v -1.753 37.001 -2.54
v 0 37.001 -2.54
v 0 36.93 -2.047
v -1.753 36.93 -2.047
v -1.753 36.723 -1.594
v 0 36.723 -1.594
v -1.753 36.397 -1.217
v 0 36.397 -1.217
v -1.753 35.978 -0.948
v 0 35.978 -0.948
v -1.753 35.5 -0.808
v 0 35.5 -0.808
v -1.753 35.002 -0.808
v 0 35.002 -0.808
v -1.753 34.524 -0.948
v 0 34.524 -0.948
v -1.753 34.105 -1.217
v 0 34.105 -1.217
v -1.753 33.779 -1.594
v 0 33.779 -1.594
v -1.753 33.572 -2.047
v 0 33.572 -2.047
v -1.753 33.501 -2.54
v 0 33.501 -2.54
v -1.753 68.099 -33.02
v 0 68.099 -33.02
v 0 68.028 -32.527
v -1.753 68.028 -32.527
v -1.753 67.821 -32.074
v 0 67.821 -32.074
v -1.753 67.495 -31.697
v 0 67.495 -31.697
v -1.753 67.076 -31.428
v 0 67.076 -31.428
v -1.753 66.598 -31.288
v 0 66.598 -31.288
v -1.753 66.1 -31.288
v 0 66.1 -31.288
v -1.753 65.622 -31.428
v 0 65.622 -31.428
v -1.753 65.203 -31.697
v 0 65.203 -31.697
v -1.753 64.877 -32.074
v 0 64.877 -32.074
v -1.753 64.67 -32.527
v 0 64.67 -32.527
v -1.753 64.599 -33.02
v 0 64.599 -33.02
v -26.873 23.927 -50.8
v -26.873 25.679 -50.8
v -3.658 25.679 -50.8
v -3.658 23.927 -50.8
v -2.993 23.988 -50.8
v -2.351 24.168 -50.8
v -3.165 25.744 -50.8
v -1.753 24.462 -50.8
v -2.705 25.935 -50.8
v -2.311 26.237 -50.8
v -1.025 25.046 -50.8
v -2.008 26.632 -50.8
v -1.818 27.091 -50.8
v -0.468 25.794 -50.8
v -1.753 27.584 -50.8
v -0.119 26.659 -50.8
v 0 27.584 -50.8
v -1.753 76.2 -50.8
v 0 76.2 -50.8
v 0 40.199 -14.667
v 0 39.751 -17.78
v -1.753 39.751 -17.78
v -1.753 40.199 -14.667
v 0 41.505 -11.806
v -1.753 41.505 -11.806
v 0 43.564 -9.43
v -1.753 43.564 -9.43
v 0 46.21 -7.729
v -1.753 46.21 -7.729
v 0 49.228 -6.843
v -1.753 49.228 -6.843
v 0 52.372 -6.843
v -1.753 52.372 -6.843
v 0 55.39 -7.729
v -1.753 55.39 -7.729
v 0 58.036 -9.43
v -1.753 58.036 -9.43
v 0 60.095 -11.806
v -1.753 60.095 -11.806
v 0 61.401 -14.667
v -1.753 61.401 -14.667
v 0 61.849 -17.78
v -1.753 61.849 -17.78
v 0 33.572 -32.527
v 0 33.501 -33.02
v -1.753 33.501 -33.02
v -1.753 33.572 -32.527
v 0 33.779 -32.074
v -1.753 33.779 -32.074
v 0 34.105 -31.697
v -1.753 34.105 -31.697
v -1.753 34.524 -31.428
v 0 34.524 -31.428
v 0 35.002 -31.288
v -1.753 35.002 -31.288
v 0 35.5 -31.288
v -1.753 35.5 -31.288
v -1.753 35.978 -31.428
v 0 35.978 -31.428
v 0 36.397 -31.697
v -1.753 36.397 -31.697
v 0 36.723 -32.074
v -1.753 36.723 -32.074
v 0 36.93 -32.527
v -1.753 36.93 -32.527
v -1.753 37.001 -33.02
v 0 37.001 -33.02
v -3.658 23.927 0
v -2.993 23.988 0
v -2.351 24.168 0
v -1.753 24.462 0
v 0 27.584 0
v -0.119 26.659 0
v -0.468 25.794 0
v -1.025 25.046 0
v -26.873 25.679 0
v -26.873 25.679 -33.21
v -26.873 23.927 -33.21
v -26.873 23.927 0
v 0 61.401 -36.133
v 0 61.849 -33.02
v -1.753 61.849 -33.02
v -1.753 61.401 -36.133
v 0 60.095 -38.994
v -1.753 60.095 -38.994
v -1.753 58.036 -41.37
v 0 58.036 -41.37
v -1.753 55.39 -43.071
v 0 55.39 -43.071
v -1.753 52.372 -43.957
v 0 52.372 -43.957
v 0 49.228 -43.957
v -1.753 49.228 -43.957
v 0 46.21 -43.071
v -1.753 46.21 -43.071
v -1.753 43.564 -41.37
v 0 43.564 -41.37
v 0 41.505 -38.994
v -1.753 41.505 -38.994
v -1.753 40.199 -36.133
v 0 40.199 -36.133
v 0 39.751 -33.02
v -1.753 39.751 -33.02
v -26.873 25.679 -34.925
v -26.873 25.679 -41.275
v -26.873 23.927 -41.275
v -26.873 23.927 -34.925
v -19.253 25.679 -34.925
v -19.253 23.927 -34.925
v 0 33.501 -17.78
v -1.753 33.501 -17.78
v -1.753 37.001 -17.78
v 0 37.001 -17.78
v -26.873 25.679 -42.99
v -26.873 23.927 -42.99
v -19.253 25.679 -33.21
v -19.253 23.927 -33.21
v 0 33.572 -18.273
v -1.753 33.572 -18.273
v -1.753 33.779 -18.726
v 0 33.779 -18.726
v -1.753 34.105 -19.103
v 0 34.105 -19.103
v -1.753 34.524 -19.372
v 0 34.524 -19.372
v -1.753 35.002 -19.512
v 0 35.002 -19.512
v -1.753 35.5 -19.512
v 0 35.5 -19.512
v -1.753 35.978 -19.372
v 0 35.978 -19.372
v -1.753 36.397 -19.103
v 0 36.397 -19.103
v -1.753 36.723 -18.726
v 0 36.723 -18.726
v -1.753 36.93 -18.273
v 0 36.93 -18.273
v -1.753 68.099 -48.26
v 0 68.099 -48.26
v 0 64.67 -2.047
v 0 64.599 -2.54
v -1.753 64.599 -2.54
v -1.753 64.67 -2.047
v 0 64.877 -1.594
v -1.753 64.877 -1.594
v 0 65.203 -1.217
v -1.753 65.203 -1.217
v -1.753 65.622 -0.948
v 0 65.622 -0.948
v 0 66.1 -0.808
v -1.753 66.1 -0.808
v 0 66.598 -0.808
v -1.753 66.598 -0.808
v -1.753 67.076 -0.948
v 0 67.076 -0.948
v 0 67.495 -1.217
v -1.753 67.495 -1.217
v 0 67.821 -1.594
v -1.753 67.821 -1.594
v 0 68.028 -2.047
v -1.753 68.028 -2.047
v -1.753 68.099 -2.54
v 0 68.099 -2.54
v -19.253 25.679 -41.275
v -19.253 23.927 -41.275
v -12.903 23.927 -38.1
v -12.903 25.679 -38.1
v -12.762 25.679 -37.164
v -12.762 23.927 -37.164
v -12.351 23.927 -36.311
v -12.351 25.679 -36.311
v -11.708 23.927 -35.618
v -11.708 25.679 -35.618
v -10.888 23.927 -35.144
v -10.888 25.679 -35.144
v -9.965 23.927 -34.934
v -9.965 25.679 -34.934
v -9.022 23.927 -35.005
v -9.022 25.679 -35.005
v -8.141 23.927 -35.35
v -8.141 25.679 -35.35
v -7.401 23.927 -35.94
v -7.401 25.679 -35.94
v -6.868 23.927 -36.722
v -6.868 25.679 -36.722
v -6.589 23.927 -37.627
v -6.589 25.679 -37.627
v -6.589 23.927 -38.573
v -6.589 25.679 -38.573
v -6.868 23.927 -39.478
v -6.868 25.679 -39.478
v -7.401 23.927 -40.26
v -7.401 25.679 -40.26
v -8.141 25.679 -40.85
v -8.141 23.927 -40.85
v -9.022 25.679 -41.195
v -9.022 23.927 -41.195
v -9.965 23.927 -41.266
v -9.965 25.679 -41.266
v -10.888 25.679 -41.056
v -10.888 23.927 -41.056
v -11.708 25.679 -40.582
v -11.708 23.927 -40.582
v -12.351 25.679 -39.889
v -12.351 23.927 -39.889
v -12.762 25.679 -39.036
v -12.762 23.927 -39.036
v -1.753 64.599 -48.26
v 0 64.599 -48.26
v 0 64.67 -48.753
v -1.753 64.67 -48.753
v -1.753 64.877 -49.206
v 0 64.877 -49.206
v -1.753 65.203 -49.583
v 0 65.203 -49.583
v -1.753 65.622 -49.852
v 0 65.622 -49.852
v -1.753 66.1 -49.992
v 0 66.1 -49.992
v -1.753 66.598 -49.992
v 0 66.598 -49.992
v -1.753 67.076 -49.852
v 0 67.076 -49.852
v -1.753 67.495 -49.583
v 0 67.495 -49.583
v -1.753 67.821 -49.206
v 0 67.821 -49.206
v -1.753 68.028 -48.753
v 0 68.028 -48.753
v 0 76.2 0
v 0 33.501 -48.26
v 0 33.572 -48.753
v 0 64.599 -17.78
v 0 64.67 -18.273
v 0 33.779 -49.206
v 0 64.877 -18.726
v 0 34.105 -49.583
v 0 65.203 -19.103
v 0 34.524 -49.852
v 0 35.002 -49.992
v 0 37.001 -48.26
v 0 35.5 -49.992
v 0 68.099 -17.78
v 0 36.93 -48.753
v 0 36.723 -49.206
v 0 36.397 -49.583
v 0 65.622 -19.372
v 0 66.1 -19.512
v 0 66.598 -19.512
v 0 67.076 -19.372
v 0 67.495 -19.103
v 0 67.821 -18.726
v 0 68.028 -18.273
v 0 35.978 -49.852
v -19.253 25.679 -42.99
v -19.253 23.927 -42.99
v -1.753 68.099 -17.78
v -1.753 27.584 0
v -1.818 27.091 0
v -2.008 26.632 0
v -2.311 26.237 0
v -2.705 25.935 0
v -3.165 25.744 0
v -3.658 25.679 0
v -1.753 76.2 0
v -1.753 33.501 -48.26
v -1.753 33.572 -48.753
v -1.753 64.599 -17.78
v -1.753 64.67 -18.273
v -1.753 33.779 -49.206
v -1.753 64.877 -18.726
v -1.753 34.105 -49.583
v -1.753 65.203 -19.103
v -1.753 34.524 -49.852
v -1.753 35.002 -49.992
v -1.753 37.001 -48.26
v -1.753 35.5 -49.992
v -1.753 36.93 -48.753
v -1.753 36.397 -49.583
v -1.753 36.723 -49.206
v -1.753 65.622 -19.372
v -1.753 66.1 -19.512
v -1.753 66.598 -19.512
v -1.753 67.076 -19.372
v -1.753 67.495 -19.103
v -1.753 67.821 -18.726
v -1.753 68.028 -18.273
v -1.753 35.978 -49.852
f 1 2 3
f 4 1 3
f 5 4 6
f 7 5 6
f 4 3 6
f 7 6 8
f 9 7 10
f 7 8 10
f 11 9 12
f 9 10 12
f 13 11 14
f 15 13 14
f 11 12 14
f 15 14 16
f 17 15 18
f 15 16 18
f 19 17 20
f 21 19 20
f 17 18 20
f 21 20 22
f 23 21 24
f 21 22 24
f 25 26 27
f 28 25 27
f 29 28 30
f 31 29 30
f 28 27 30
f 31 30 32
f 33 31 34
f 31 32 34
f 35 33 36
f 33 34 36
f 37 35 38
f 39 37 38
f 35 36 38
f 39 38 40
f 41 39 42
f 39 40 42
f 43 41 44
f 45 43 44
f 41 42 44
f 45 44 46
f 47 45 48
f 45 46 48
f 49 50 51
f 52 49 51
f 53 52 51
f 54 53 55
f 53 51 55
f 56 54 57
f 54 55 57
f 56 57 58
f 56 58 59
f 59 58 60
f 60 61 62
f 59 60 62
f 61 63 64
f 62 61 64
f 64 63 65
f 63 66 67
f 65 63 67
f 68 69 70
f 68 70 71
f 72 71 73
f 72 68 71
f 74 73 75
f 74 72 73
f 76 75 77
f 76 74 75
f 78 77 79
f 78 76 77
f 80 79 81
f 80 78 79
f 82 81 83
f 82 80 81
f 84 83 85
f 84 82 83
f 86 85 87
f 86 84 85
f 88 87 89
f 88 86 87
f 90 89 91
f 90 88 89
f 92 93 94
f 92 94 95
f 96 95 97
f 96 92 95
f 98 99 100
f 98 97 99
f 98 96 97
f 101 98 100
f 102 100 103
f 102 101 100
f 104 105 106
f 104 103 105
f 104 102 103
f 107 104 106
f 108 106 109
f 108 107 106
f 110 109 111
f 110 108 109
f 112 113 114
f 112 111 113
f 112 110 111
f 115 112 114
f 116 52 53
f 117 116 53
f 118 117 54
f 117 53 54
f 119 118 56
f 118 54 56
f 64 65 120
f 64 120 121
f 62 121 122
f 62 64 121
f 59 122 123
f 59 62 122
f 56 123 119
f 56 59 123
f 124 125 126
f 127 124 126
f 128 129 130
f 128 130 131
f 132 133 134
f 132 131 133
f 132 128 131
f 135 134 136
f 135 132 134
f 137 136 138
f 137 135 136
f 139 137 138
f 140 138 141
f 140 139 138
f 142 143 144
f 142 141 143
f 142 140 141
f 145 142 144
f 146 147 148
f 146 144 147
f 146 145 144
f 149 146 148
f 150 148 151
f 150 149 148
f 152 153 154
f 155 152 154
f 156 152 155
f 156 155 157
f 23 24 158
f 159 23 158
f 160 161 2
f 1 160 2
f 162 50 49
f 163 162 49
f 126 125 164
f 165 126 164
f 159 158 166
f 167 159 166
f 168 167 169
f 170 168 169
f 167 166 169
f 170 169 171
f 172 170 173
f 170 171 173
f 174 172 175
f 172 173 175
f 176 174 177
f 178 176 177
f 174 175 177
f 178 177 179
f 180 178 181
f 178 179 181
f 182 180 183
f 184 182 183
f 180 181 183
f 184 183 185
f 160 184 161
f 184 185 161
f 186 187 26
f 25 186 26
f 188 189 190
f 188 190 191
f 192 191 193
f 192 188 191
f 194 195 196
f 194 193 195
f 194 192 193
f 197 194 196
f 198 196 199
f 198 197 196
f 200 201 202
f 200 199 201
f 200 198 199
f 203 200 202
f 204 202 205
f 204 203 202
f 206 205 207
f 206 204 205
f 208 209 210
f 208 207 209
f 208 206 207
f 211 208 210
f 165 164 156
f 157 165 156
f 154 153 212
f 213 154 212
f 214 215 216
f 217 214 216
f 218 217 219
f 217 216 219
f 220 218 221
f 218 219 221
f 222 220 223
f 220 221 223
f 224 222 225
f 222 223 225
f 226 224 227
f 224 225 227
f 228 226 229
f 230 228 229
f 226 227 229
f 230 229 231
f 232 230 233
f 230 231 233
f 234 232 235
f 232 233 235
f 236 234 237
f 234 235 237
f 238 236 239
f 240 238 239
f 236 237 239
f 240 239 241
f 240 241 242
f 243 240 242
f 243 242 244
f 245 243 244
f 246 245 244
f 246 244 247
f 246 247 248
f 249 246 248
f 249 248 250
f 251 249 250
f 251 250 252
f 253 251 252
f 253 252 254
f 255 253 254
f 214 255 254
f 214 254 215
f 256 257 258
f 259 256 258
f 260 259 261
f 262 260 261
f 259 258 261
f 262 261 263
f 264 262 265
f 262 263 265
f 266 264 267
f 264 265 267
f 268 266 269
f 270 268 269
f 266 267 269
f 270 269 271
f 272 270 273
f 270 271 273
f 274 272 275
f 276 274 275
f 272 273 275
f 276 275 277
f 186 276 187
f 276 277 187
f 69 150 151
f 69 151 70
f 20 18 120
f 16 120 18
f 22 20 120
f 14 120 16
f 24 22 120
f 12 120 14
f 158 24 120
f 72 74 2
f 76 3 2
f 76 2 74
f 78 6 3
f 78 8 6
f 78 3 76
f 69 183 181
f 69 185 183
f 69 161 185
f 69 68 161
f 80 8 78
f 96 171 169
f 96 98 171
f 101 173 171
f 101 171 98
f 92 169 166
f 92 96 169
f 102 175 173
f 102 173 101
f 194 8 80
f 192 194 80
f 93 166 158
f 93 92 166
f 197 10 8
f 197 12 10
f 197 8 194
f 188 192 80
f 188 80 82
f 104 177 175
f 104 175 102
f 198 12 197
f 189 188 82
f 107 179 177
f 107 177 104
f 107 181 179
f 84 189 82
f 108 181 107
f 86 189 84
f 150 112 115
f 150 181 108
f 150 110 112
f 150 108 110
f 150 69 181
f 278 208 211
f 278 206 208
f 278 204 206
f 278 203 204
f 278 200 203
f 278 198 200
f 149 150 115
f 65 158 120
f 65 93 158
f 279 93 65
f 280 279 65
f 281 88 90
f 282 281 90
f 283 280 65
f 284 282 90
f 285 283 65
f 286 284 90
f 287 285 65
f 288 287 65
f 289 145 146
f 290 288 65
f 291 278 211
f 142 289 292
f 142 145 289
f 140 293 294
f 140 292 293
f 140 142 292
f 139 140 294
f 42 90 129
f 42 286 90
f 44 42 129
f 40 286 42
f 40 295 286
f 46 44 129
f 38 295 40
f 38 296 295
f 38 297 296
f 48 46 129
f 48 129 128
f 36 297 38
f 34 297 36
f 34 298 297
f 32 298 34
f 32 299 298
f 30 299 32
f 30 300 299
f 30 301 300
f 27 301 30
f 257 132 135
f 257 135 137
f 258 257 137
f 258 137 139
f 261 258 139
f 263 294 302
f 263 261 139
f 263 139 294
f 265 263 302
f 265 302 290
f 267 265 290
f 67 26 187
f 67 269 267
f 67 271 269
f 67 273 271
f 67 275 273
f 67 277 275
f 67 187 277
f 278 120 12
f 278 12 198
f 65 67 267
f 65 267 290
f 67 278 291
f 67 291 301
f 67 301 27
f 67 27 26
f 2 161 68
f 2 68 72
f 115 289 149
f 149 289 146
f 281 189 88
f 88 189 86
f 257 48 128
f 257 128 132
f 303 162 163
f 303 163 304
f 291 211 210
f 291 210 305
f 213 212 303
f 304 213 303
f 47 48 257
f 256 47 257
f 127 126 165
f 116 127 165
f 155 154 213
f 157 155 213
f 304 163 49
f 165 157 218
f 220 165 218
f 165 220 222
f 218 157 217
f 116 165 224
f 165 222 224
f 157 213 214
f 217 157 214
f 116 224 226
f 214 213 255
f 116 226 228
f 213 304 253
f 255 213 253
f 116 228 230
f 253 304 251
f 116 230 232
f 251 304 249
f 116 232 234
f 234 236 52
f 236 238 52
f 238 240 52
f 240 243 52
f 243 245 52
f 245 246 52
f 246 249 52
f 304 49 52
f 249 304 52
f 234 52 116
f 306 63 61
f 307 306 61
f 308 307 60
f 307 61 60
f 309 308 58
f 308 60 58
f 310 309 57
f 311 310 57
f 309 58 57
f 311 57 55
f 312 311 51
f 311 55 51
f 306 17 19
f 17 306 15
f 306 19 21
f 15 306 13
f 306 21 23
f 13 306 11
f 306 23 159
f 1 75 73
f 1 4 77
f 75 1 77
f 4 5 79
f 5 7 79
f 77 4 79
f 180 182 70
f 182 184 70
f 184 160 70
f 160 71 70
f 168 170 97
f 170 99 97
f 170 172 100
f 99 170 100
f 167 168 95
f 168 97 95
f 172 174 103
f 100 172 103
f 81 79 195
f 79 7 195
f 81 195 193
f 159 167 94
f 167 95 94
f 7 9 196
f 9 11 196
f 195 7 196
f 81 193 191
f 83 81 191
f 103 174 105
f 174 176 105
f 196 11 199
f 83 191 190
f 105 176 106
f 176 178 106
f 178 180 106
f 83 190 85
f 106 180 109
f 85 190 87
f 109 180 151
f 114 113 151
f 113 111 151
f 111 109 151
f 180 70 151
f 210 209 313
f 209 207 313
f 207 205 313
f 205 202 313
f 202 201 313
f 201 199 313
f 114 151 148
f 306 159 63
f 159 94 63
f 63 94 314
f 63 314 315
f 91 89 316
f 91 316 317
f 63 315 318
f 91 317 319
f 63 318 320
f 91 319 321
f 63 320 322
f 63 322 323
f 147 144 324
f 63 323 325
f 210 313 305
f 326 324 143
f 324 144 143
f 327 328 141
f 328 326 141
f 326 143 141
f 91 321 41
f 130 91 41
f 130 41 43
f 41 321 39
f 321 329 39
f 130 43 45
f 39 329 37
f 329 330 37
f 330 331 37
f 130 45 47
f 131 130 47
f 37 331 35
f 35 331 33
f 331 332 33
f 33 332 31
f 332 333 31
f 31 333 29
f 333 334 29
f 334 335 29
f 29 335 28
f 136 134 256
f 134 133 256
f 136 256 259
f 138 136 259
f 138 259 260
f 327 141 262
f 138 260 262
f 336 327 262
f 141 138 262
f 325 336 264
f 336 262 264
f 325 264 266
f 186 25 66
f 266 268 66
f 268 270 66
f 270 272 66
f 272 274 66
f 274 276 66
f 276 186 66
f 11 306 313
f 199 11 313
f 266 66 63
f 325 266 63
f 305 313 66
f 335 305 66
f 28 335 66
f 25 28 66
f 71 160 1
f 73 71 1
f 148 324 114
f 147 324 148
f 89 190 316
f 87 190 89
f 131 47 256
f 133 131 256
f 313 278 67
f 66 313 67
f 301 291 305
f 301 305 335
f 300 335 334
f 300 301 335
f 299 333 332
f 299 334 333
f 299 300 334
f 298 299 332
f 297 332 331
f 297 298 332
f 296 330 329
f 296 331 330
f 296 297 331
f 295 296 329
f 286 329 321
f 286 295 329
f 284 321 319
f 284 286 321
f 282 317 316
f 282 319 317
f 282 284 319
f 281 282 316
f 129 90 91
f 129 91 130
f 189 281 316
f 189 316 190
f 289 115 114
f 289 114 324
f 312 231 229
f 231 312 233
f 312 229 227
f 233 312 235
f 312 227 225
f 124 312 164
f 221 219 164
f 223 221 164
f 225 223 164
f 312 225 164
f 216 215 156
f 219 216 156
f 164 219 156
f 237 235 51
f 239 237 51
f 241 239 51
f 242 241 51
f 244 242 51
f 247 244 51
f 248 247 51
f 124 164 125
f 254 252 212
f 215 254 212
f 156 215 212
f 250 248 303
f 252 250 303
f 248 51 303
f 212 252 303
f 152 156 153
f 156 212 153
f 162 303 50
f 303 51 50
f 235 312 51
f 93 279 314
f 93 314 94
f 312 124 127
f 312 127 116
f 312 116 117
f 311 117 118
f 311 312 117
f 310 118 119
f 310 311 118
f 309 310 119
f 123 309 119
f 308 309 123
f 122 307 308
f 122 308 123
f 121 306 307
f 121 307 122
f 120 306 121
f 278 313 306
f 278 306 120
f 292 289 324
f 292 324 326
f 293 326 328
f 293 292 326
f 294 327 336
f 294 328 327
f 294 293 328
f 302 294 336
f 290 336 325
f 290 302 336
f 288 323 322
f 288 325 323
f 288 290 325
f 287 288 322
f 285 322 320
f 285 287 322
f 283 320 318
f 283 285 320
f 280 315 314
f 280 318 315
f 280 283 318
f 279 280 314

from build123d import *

# Parameters (mm, degrees)
SKETCH2_W              = 50.8
SKETCH2_H              = 76.2
BASE_FLANGE1_DEPTH     = 1.7526
SKETCHED_START         = -50.8
SKETCHED_BEND1_DEPTH   = 50.8
SKETCHED_BEND1_2_DEPTH = 50.8
CUT_EXTRUDE2_DEPTH     = 96.442377265
CUT_EXTRUDE3_REACH     = 97.512
CUT_EXTRUDE4_REACH     = 78.519
SKETCH11_R             = 3.175
CUT_EXTRUDE5_REACH     = 78.519
SKETCH12_W             = 7.62
SKETCH12_H             = 1.7145


# Read off the part's stored shape, not the designer's step: Sketched Bend1
# Sheet-metal steps are written as plain solids
with BuildPart() as part:
    # Sketch2 → Base-Flange1 (new body)
    with BuildSketch(Plane(origin=(0, 0, 0), x_dir=(0, 0, -1), z_dir=(1, 0, 0))):
        with Locations((25.4, 38.1)):
            Rectangle(SKETCH2_W, SKETCH2_H)
    extrude(amount=-BASE_FLANGE1_DEPTH)

    # Sketched Bend1 outline → Sketched Bend1 (cut)
    with BuildSketch(Plane.XY.offset(SKETCHED_START)):
        with BuildLine():
            ThreePointArc((0, 27.584427912), (-0.468104291, 25.794133277), (-1.7526, 24.462087002))
            Line((-1.7526, 24.462087002), (-1.7526, 0))
            Line((-1.7526, 0), (0, 0))
            Line((0, 0), (0, 27.584427912))
        make_face()
    extrude(amount=SKETCHED_BEND1_DEPTH, mode=Mode.SUBTRACT)

    # Sketched Bend1 2 outline → Sketched Bend1 2 (add)
    with BuildSketch(Plane.XY.offset(SKETCHED_START)):
        with BuildLine():
            ThreePointArc((-1.7526, 27.584427912), (-2.310561582, 26.237389494), (-3.6576, 25.679427912))
            Line((-3.6576, 25.679427912), (-26.873172088, 25.679427912))
            Line((-26.873172088, 25.679427912), (-26.873172088, 23.926827912))
            Line((-26.873172088, 23.926827912), (-3.6576, 23.926827912))
            ThreePointArc((-3.6576, 23.926827912), (-2.668215432, 24.063184391), (-1.7526, 24.462087002))
            Line((-1.7526, 24.462087002), (-1.7526, 27.584427912))
        make_face()
    extrude(amount=SKETCHED_BEND1_2_DEPTH)

    # Sketch9 → Cut-Extrude2 (cut, through all)
    with BuildSketch(Plane(origin=(0, 0, 0), x_dir=(0, 0, -1), z_dir=(1, 0, 0))):
        with BuildLine():
            Line((33.02, 39.751), (17.78, 39.751))
            ThreePointArc((17.78, 39.751), (6.731, 50.8), (17.78, 61.849))
            Line((17.78, 61.849), (33.02, 61.849))
            ThreePointArc((33.02, 61.849), (44.069, 50.8), (33.02, 39.751))
        make_face()
    extrude(amount=-CUT_EXTRUDE2_DEPTH, mode=Mode.SUBTRACT)

    # Sketch10 → Cut-Extrude3 (cut, up to next)
    with BuildSketch(Plane(origin=(0.2474, 0, 0), x_dir=(0, 0, -1), z_dir=(1, 0, 0)), mode=Mode.PRIVATE) as cut_extrude3_sk1:
        with BuildLine():
            Line((2.54, 68.099), (17.78, 68.099))
            ThreePointArc((17.78, 68.099), (19.53, 66.349), (17.78, 64.599))
            Line((17.78, 64.599), (2.54, 64.599))
            ThreePointArc((2.54, 64.599), (0.79, 66.349), (2.54, 68.099))
        make_face()
    cut_extrude3_tool1 = extrude(cut_extrude3_sk1.sketch, amount=-CUT_EXTRUDE3_REACH, mode=Mode.PRIVATE) & part.part
    # Sketch10 → Cut-Extrude3 (cut, up to next)
    with BuildSketch(Plane(origin=(0.2474, 0, 0), x_dir=(0, 0, -1), z_dir=(1, 0, 0)), mode=Mode.PRIVATE) as cut_extrude3_sk2:
        with BuildLine():
            Line((2.54, 33.501), (17.78, 33.501))
            ThreePointArc((17.78, 33.501), (19.53, 35.251), (17.78, 37.001))
            Line((17.78, 37.001), (2.54, 37.001))
            ThreePointArc((2.54, 37.001), (0.79, 35.251), (2.54, 33.501))
        make_face()
    cut_extrude3_tool2 = extrude(cut_extrude3_sk2.sketch, amount=-CUT_EXTRUDE3_REACH, mode=Mode.PRIVATE) & part.part
    # Sketch10 → Cut-Extrude3 (cut, up to next)
    with BuildSketch(Plane(origin=(0.2474, 0, 0), x_dir=(0, 0, -1), z_dir=(1, 0, 0)), mode=Mode.PRIVATE) as cut_extrude3_sk3:
        with BuildLine():
            Line((48.26, 33.501), (33.02, 33.501))
            ThreePointArc((33.02, 33.501), (31.27, 35.251), (33.02, 37.001))
            Line((33.02, 37.001), (48.26, 37.001))
            ThreePointArc((48.26, 37.001), (50.01, 35.251), (48.26, 33.501))
        make_face()
    cut_extrude3_tool3 = extrude(cut_extrude3_sk3.sketch, amount=-CUT_EXTRUDE3_REACH, mode=Mode.PRIVATE) & part.part
    # Sketch10 → Cut-Extrude3 (cut, up to next)
    with BuildSketch(Plane(origin=(0.2474, 0, 0), x_dir=(0, 0, -1), z_dir=(1, 0, 0)), mode=Mode.PRIVATE) as cut_extrude3_sk4:
        with BuildLine():
            Line((48.26, 68.099), (33.02, 68.099))
            ThreePointArc((33.02, 68.099), (31.27, 66.349), (33.02, 64.599))
            Line((33.02, 64.599), (48.26, 64.599))
            ThreePointArc((48.26, 64.599), (50.01, 66.349), (48.26, 68.099))
        make_face()
    cut_extrude3_tool4 = extrude(cut_extrude3_sk4.sketch, amount=-CUT_EXTRUDE3_REACH, mode=Mode.PRIVATE) & part.part
    add(cut_extrude3_tool1.solids().sort_by_distance((0.2474, 66.349, -10.16))[0], mode=Mode.SUBTRACT)
    add(cut_extrude3_tool2.solids().sort_by_distance((0.2474, 35.251, -10.16))[0], mode=Mode.SUBTRACT)
    add(cut_extrude3_tool3.solids().sort_by_distance((0.2474, 35.251, -40.64))[0], mode=Mode.SUBTRACT)
    add(cut_extrude3_tool4.solids().sort_by_distance((0.2474, 66.349, -40.64))[0], mode=Mode.SUBTRACT)

    # Sketch11 → Cut-Extrude4 (cut, up to next)
    with BuildSketch(Plane(origin=(0, 25.679427912, 0), x_dir=(1, 0, 0), z_dir=(0, 1, 0)), mode=Mode.PRIVATE) as cut_extrude4_sk1:
        with Locations(Location((-9.728172088, 38.1, 0), (0, 0, 180))):
            Circle(SKETCH11_R)
    cut_extrude4_tool1 = extrude(cut_extrude4_sk1.sketch, amount=-CUT_EXTRUDE4_REACH, mode=Mode.PRIVATE) & part.part
    add(cut_extrude4_tool1.solids().sort_by_distance((-9.728172, 25.679428, -38.1))[0], mode=Mode.SUBTRACT)

    # Sketch12 → Cut-Extrude5 (cut, up to next)
    with BuildSketch(Plane(origin=(0, 25.679427912, 0), x_dir=(1, 0, 0), z_dir=(0, 1, 0)), mode=Mode.PRIVATE) as cut_extrude5_sk1:
        with Locations((-23.063172088, 34.06775)):
            Rectangle(SKETCH12_W, SKETCH12_H)
    cut_extrude5_tool1 = extrude(cut_extrude5_sk1.sketch, amount=-CUT_EXTRUDE5_REACH, mode=Mode.PRIVATE) & part.part
    # Sketch12 → Cut-Extrude5 (cut, up to next)
    with BuildSketch(Plane(origin=(0, 25.679427912, 0), x_dir=(1, 0, 0), z_dir=(0, 1, 0)), mode=Mode.PRIVATE) as cut_extrude5_sk2:
        with Locations((-23.063172088, 42.13225)):
            Rectangle(SKETCH12_W, SKETCH12_H)
    cut_extrude5_tool2 = extrude(cut_extrude5_sk2.sketch, amount=-CUT_EXTRUDE5_REACH, mode=Mode.PRIVATE) & part.part
    add(cut_extrude5_tool1.solids().sort_by_distance((-23.063172, 25.679428, -34.06775))[0], mode=Mode.SUBTRACT)
    add(cut_extrude5_tool2.solids().sort_by_distance((-23.063172, 25.679428, -42.13225))[0], mode=Mode.SUBTRACT)


solid = part.part
